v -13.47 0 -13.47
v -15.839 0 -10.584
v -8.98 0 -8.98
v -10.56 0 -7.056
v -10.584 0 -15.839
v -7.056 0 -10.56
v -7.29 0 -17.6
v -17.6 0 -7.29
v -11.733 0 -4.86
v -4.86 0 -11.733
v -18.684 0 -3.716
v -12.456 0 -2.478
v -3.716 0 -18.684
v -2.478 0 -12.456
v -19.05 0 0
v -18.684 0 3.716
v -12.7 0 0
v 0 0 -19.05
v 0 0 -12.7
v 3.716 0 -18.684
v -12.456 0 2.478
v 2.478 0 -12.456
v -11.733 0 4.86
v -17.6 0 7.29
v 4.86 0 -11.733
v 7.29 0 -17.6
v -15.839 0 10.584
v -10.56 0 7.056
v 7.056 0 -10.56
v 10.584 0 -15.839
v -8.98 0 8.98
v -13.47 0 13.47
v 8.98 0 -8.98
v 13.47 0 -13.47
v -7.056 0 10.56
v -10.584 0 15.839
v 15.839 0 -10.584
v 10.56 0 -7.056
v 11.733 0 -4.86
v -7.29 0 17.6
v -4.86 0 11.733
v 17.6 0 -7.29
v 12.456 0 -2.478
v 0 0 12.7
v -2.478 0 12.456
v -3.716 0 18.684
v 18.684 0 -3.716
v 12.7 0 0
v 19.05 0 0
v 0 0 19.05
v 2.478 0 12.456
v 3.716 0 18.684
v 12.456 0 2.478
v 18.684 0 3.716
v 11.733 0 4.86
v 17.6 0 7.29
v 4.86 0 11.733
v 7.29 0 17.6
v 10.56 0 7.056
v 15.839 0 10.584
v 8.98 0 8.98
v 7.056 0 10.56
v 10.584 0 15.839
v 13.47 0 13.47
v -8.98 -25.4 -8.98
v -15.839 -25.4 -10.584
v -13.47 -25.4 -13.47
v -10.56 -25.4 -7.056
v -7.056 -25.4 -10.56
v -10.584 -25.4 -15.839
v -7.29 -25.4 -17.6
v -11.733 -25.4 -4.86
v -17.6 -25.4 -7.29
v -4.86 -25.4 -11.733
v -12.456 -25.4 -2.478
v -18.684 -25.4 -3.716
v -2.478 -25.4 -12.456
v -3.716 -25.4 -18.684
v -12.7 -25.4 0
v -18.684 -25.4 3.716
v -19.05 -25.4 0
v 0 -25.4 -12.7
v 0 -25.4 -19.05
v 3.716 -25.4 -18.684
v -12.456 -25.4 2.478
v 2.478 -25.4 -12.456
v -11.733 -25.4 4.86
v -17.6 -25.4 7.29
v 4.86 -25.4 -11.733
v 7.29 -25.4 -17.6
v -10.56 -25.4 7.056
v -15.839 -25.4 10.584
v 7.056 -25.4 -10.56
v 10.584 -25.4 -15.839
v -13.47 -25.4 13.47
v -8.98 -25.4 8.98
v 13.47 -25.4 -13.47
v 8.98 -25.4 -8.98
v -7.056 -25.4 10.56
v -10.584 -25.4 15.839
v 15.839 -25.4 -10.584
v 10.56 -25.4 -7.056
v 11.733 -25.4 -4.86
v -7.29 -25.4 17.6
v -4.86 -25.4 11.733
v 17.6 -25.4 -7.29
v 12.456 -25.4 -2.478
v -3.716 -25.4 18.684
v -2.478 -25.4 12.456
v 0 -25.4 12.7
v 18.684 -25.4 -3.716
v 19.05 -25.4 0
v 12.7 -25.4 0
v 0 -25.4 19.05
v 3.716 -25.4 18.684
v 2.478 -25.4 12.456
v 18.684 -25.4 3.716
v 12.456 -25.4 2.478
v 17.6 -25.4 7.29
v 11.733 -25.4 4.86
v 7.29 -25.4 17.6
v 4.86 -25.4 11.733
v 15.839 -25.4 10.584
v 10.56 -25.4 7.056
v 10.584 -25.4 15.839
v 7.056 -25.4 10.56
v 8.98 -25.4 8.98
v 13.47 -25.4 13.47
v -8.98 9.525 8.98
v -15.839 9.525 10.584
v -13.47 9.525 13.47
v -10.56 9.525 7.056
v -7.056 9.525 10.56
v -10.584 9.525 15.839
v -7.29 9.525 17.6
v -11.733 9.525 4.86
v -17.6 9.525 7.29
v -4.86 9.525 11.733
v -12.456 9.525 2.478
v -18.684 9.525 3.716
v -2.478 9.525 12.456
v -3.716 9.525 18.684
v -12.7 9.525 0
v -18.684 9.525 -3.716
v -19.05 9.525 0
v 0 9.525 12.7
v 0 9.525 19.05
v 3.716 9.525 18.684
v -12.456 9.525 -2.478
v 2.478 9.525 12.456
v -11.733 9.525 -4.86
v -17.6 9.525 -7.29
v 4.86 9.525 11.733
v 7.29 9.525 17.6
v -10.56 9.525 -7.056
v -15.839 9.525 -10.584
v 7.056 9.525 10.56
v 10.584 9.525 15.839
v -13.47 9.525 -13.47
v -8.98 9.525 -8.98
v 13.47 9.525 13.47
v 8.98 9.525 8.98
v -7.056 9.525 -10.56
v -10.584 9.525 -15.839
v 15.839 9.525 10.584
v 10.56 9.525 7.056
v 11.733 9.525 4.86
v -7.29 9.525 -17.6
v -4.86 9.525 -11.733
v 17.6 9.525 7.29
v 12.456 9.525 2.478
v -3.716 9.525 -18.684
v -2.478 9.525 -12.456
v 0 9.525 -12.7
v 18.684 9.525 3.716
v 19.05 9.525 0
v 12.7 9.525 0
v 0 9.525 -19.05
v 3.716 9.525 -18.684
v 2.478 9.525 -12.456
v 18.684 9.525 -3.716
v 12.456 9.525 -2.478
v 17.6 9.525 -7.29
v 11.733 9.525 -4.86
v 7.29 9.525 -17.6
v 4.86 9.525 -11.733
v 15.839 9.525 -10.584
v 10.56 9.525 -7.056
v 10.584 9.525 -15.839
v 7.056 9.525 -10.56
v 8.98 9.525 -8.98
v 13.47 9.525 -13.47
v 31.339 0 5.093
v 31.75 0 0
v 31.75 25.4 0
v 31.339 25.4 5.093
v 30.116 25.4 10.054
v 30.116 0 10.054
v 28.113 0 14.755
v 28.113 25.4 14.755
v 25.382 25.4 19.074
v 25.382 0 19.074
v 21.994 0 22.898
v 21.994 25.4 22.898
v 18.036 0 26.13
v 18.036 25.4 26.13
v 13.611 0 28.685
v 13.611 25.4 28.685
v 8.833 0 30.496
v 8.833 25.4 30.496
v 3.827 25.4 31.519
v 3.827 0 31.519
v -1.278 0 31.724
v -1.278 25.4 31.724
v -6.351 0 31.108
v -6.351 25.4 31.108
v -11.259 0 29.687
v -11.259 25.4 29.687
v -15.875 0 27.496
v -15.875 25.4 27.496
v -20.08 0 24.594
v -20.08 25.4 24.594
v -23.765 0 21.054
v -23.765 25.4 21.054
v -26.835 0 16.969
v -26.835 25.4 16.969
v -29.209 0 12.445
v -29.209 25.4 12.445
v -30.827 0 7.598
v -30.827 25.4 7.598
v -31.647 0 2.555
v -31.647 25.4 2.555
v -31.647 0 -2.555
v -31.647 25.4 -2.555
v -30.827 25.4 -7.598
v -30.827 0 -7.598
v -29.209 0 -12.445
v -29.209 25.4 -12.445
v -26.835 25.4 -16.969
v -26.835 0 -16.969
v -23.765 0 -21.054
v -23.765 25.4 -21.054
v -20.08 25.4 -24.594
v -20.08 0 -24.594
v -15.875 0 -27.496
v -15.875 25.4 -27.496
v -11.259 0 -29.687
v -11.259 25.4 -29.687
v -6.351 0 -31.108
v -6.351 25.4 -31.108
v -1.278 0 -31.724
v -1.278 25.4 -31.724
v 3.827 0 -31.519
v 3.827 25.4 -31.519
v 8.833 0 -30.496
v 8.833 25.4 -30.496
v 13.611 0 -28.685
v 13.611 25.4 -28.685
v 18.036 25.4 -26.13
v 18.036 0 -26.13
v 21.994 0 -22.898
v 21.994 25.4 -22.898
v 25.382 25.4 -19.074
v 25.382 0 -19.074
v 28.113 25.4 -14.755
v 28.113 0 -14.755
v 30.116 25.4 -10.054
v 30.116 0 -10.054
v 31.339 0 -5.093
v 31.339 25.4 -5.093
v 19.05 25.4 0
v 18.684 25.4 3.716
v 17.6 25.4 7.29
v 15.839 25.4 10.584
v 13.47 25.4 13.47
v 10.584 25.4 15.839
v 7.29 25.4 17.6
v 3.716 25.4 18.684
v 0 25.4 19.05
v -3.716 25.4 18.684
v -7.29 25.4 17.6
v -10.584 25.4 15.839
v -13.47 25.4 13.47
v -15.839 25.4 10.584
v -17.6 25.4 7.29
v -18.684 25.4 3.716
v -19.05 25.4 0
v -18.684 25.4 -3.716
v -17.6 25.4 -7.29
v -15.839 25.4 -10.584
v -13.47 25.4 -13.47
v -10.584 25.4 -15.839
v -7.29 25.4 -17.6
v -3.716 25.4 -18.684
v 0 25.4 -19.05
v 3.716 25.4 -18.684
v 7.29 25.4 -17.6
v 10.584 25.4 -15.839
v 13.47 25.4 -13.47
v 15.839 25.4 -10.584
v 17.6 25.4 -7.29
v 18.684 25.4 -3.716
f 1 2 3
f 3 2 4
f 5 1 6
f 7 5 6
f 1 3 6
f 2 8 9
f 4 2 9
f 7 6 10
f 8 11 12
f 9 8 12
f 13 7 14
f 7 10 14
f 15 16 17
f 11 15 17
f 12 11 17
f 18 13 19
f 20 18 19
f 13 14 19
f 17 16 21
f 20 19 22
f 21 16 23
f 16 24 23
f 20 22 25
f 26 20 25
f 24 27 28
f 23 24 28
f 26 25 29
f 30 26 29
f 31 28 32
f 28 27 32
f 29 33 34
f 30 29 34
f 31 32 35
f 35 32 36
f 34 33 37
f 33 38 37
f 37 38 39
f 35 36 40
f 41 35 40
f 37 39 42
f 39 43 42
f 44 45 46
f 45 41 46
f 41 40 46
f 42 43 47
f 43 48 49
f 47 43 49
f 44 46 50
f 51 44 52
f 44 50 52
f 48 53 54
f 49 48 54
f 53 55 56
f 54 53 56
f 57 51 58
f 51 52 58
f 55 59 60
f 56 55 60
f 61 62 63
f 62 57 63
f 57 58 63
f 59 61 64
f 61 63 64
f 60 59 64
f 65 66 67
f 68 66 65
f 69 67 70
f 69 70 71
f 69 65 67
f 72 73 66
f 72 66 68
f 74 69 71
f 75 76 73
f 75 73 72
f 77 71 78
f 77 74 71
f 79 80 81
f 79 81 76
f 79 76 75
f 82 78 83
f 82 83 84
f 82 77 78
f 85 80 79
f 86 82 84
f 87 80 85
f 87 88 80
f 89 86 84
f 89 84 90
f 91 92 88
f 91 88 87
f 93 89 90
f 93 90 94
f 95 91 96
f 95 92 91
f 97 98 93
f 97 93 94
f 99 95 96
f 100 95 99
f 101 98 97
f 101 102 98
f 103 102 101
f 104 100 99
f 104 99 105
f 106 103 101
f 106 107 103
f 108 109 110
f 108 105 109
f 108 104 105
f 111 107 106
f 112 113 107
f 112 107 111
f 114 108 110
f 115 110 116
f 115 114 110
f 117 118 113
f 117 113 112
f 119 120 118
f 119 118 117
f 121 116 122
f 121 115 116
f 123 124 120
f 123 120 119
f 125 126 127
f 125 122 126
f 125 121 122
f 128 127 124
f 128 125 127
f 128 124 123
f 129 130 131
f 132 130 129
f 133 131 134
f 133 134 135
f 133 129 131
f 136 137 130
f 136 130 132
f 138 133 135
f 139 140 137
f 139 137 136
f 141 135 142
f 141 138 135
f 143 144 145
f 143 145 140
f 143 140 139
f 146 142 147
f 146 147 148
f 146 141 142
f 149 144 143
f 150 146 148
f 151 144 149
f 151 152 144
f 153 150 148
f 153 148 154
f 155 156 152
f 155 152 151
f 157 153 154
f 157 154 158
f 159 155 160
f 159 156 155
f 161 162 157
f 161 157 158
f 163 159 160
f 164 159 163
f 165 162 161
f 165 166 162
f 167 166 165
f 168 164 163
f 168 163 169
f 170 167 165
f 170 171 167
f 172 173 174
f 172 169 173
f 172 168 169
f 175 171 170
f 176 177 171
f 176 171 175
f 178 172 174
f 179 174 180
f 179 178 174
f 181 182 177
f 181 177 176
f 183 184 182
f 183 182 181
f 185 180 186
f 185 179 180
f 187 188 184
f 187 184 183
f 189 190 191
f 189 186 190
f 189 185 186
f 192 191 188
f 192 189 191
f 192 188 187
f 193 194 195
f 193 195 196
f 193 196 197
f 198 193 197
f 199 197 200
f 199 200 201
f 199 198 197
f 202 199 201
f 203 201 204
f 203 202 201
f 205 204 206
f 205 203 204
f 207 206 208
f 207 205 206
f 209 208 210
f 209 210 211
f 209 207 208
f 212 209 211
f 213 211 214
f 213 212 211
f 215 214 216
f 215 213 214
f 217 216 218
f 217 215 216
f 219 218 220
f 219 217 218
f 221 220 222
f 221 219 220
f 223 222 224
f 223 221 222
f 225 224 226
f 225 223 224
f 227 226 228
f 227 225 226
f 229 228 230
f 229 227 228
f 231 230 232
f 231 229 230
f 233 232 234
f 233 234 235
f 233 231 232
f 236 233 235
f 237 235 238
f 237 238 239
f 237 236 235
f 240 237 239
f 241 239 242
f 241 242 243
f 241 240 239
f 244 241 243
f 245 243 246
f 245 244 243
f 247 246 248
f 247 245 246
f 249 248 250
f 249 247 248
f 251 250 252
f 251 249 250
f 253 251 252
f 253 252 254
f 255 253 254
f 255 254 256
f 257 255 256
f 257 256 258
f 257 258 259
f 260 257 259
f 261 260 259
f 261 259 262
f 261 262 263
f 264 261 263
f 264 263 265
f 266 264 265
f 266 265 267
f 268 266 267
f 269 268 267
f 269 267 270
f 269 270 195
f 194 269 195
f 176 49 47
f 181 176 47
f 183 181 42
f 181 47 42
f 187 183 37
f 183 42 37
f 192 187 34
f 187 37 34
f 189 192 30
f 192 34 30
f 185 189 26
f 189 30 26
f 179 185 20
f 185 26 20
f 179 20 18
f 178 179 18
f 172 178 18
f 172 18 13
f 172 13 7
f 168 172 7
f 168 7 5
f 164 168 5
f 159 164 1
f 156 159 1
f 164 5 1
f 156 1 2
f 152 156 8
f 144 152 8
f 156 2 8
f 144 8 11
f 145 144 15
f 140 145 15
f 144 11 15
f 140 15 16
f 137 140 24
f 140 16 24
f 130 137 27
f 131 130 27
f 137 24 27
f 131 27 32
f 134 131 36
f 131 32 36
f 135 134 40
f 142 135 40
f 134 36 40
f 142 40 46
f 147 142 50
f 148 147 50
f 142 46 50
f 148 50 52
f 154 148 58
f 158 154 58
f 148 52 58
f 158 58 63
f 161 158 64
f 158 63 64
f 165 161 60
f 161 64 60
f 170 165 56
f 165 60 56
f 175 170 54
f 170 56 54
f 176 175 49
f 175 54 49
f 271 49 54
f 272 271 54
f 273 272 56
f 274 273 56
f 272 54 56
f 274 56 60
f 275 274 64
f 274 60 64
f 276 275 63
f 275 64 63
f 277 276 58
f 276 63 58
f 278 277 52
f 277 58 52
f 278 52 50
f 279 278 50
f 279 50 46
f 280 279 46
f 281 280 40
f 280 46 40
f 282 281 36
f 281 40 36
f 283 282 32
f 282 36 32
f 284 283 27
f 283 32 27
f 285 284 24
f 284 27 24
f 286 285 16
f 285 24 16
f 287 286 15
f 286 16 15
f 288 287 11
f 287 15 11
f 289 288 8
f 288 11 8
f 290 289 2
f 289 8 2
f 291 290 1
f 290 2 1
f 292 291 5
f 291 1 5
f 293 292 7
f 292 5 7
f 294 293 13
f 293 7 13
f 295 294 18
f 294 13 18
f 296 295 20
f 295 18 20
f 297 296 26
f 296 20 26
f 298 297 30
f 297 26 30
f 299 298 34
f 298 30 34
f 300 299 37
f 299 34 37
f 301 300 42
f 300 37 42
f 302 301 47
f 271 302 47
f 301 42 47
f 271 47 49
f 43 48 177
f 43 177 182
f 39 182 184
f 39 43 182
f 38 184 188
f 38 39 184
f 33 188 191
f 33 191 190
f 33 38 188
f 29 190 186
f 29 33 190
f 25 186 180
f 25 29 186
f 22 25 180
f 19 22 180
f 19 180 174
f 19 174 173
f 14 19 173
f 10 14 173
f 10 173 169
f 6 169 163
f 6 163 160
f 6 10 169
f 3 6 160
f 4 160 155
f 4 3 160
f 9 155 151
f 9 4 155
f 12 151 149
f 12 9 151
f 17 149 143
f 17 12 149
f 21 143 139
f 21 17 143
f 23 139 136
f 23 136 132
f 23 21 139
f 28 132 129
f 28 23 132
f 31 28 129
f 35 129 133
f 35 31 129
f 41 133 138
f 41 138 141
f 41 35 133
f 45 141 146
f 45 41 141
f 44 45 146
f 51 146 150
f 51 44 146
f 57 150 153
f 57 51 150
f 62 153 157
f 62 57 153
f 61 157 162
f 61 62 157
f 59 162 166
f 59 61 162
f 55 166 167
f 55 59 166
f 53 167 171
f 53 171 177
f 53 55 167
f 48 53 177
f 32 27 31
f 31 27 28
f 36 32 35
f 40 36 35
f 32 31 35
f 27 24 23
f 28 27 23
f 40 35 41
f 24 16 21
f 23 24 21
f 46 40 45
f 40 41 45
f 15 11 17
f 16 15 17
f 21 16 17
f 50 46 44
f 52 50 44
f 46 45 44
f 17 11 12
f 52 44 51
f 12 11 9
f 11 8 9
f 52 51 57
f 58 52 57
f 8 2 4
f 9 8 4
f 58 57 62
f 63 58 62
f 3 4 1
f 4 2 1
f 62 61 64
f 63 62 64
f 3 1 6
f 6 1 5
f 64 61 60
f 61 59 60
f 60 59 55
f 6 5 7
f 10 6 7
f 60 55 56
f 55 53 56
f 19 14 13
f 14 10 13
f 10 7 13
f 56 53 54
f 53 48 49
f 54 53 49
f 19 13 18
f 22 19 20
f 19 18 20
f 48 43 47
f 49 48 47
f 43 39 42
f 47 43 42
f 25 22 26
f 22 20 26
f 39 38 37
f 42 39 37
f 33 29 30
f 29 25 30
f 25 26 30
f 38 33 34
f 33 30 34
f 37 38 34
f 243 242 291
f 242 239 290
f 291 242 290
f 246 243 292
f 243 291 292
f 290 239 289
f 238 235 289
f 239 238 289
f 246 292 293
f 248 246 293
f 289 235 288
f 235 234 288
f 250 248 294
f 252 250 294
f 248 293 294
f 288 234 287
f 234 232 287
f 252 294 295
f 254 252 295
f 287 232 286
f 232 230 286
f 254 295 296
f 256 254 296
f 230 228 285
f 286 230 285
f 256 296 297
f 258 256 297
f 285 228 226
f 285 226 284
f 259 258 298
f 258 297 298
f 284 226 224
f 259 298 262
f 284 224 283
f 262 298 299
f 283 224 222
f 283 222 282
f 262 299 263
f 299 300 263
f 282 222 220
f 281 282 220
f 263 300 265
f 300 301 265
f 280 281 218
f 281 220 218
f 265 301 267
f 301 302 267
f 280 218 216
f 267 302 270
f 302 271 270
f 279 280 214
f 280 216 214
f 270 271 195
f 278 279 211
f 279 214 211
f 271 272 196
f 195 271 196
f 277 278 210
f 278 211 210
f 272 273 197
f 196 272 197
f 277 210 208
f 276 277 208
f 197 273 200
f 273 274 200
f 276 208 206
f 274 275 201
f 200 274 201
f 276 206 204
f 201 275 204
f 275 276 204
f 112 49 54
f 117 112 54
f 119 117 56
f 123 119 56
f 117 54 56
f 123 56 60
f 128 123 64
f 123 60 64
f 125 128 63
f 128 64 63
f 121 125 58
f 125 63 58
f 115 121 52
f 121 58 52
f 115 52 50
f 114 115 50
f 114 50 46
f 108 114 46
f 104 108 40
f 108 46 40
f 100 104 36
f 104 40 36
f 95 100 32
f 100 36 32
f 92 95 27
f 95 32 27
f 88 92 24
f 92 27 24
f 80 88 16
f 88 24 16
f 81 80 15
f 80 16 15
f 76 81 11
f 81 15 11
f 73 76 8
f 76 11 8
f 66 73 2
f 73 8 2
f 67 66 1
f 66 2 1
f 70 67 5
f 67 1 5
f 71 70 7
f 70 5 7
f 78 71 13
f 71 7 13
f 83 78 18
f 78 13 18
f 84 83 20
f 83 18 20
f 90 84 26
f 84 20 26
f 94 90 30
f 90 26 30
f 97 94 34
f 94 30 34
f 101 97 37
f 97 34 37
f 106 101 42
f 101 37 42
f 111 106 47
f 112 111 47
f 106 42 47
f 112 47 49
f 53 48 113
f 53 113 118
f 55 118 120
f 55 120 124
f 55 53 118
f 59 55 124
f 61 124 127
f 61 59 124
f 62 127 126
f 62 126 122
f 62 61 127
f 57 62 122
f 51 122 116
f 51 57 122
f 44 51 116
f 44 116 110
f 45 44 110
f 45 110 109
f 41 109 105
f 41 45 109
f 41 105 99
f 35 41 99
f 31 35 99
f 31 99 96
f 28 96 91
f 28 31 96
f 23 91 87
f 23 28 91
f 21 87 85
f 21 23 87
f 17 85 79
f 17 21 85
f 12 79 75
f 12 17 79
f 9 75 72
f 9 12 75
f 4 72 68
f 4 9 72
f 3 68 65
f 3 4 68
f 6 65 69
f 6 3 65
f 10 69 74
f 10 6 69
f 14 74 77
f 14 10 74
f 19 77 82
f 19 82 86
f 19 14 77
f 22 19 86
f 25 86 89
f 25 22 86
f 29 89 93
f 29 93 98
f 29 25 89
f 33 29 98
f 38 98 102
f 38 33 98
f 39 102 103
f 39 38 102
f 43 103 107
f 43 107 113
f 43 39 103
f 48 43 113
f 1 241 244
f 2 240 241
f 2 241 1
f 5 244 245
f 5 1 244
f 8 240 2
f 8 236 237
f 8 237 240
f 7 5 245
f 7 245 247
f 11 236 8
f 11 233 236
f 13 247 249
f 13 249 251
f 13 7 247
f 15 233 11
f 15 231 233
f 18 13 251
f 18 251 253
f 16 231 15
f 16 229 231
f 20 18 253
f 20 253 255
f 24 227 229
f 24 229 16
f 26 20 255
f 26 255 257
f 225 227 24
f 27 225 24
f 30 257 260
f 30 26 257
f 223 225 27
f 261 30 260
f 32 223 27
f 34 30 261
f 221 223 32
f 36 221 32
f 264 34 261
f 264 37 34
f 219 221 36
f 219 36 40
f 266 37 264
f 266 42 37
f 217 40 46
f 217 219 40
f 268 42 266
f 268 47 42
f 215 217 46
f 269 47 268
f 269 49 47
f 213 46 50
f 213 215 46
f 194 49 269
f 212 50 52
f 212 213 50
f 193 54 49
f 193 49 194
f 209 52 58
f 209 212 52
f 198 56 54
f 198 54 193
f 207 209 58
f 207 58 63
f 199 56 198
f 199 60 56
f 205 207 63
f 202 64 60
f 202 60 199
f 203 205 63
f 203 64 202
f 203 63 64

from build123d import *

# Parameters (mm, degrees)
F0_R        = 19.05
F0_R_2      = 12.7
F1_DEPTH    = 25.4
F0_R_3      = 31.75
F2_DEPTH    = 25.4
F1_FACE_R   = 19.05
F1_FACE_R_2 = 12.7
F3_DEPTH    = 9.525


with BuildPart() as f1:
    # F0 (on Front) → F1 (new body)
    with BuildSketch(Plane.XZ):
        Circle(F0_R)
        Circle(F0_R_2, mode=Mode.SUBTRACT)
    extrude(amount=F1_DEPTH)

    # F0 (on Front) → F2 (join)
    with BuildSketch(Plane.XZ):
        Circle(F0_R_3)
        Circle(F0_R, mode=Mode.SUBTRACT)
    extrude(amount=-F2_DEPTH)


with BuildPart() as f3:
    # F1_face (on face) → F3 (new body)
    with BuildSketch(Plane(origin=(0, 0, 0), x_dir=(1, 0, 0), z_dir=(0, 1, 0))):
        Circle(F1_FACE_R)
        Circle(F1_FACE_R_2, mode=Mode.SUBTRACT)
    extrude(amount=F3_DEPTH)


solid = Compound([f1.part, f3.part])
